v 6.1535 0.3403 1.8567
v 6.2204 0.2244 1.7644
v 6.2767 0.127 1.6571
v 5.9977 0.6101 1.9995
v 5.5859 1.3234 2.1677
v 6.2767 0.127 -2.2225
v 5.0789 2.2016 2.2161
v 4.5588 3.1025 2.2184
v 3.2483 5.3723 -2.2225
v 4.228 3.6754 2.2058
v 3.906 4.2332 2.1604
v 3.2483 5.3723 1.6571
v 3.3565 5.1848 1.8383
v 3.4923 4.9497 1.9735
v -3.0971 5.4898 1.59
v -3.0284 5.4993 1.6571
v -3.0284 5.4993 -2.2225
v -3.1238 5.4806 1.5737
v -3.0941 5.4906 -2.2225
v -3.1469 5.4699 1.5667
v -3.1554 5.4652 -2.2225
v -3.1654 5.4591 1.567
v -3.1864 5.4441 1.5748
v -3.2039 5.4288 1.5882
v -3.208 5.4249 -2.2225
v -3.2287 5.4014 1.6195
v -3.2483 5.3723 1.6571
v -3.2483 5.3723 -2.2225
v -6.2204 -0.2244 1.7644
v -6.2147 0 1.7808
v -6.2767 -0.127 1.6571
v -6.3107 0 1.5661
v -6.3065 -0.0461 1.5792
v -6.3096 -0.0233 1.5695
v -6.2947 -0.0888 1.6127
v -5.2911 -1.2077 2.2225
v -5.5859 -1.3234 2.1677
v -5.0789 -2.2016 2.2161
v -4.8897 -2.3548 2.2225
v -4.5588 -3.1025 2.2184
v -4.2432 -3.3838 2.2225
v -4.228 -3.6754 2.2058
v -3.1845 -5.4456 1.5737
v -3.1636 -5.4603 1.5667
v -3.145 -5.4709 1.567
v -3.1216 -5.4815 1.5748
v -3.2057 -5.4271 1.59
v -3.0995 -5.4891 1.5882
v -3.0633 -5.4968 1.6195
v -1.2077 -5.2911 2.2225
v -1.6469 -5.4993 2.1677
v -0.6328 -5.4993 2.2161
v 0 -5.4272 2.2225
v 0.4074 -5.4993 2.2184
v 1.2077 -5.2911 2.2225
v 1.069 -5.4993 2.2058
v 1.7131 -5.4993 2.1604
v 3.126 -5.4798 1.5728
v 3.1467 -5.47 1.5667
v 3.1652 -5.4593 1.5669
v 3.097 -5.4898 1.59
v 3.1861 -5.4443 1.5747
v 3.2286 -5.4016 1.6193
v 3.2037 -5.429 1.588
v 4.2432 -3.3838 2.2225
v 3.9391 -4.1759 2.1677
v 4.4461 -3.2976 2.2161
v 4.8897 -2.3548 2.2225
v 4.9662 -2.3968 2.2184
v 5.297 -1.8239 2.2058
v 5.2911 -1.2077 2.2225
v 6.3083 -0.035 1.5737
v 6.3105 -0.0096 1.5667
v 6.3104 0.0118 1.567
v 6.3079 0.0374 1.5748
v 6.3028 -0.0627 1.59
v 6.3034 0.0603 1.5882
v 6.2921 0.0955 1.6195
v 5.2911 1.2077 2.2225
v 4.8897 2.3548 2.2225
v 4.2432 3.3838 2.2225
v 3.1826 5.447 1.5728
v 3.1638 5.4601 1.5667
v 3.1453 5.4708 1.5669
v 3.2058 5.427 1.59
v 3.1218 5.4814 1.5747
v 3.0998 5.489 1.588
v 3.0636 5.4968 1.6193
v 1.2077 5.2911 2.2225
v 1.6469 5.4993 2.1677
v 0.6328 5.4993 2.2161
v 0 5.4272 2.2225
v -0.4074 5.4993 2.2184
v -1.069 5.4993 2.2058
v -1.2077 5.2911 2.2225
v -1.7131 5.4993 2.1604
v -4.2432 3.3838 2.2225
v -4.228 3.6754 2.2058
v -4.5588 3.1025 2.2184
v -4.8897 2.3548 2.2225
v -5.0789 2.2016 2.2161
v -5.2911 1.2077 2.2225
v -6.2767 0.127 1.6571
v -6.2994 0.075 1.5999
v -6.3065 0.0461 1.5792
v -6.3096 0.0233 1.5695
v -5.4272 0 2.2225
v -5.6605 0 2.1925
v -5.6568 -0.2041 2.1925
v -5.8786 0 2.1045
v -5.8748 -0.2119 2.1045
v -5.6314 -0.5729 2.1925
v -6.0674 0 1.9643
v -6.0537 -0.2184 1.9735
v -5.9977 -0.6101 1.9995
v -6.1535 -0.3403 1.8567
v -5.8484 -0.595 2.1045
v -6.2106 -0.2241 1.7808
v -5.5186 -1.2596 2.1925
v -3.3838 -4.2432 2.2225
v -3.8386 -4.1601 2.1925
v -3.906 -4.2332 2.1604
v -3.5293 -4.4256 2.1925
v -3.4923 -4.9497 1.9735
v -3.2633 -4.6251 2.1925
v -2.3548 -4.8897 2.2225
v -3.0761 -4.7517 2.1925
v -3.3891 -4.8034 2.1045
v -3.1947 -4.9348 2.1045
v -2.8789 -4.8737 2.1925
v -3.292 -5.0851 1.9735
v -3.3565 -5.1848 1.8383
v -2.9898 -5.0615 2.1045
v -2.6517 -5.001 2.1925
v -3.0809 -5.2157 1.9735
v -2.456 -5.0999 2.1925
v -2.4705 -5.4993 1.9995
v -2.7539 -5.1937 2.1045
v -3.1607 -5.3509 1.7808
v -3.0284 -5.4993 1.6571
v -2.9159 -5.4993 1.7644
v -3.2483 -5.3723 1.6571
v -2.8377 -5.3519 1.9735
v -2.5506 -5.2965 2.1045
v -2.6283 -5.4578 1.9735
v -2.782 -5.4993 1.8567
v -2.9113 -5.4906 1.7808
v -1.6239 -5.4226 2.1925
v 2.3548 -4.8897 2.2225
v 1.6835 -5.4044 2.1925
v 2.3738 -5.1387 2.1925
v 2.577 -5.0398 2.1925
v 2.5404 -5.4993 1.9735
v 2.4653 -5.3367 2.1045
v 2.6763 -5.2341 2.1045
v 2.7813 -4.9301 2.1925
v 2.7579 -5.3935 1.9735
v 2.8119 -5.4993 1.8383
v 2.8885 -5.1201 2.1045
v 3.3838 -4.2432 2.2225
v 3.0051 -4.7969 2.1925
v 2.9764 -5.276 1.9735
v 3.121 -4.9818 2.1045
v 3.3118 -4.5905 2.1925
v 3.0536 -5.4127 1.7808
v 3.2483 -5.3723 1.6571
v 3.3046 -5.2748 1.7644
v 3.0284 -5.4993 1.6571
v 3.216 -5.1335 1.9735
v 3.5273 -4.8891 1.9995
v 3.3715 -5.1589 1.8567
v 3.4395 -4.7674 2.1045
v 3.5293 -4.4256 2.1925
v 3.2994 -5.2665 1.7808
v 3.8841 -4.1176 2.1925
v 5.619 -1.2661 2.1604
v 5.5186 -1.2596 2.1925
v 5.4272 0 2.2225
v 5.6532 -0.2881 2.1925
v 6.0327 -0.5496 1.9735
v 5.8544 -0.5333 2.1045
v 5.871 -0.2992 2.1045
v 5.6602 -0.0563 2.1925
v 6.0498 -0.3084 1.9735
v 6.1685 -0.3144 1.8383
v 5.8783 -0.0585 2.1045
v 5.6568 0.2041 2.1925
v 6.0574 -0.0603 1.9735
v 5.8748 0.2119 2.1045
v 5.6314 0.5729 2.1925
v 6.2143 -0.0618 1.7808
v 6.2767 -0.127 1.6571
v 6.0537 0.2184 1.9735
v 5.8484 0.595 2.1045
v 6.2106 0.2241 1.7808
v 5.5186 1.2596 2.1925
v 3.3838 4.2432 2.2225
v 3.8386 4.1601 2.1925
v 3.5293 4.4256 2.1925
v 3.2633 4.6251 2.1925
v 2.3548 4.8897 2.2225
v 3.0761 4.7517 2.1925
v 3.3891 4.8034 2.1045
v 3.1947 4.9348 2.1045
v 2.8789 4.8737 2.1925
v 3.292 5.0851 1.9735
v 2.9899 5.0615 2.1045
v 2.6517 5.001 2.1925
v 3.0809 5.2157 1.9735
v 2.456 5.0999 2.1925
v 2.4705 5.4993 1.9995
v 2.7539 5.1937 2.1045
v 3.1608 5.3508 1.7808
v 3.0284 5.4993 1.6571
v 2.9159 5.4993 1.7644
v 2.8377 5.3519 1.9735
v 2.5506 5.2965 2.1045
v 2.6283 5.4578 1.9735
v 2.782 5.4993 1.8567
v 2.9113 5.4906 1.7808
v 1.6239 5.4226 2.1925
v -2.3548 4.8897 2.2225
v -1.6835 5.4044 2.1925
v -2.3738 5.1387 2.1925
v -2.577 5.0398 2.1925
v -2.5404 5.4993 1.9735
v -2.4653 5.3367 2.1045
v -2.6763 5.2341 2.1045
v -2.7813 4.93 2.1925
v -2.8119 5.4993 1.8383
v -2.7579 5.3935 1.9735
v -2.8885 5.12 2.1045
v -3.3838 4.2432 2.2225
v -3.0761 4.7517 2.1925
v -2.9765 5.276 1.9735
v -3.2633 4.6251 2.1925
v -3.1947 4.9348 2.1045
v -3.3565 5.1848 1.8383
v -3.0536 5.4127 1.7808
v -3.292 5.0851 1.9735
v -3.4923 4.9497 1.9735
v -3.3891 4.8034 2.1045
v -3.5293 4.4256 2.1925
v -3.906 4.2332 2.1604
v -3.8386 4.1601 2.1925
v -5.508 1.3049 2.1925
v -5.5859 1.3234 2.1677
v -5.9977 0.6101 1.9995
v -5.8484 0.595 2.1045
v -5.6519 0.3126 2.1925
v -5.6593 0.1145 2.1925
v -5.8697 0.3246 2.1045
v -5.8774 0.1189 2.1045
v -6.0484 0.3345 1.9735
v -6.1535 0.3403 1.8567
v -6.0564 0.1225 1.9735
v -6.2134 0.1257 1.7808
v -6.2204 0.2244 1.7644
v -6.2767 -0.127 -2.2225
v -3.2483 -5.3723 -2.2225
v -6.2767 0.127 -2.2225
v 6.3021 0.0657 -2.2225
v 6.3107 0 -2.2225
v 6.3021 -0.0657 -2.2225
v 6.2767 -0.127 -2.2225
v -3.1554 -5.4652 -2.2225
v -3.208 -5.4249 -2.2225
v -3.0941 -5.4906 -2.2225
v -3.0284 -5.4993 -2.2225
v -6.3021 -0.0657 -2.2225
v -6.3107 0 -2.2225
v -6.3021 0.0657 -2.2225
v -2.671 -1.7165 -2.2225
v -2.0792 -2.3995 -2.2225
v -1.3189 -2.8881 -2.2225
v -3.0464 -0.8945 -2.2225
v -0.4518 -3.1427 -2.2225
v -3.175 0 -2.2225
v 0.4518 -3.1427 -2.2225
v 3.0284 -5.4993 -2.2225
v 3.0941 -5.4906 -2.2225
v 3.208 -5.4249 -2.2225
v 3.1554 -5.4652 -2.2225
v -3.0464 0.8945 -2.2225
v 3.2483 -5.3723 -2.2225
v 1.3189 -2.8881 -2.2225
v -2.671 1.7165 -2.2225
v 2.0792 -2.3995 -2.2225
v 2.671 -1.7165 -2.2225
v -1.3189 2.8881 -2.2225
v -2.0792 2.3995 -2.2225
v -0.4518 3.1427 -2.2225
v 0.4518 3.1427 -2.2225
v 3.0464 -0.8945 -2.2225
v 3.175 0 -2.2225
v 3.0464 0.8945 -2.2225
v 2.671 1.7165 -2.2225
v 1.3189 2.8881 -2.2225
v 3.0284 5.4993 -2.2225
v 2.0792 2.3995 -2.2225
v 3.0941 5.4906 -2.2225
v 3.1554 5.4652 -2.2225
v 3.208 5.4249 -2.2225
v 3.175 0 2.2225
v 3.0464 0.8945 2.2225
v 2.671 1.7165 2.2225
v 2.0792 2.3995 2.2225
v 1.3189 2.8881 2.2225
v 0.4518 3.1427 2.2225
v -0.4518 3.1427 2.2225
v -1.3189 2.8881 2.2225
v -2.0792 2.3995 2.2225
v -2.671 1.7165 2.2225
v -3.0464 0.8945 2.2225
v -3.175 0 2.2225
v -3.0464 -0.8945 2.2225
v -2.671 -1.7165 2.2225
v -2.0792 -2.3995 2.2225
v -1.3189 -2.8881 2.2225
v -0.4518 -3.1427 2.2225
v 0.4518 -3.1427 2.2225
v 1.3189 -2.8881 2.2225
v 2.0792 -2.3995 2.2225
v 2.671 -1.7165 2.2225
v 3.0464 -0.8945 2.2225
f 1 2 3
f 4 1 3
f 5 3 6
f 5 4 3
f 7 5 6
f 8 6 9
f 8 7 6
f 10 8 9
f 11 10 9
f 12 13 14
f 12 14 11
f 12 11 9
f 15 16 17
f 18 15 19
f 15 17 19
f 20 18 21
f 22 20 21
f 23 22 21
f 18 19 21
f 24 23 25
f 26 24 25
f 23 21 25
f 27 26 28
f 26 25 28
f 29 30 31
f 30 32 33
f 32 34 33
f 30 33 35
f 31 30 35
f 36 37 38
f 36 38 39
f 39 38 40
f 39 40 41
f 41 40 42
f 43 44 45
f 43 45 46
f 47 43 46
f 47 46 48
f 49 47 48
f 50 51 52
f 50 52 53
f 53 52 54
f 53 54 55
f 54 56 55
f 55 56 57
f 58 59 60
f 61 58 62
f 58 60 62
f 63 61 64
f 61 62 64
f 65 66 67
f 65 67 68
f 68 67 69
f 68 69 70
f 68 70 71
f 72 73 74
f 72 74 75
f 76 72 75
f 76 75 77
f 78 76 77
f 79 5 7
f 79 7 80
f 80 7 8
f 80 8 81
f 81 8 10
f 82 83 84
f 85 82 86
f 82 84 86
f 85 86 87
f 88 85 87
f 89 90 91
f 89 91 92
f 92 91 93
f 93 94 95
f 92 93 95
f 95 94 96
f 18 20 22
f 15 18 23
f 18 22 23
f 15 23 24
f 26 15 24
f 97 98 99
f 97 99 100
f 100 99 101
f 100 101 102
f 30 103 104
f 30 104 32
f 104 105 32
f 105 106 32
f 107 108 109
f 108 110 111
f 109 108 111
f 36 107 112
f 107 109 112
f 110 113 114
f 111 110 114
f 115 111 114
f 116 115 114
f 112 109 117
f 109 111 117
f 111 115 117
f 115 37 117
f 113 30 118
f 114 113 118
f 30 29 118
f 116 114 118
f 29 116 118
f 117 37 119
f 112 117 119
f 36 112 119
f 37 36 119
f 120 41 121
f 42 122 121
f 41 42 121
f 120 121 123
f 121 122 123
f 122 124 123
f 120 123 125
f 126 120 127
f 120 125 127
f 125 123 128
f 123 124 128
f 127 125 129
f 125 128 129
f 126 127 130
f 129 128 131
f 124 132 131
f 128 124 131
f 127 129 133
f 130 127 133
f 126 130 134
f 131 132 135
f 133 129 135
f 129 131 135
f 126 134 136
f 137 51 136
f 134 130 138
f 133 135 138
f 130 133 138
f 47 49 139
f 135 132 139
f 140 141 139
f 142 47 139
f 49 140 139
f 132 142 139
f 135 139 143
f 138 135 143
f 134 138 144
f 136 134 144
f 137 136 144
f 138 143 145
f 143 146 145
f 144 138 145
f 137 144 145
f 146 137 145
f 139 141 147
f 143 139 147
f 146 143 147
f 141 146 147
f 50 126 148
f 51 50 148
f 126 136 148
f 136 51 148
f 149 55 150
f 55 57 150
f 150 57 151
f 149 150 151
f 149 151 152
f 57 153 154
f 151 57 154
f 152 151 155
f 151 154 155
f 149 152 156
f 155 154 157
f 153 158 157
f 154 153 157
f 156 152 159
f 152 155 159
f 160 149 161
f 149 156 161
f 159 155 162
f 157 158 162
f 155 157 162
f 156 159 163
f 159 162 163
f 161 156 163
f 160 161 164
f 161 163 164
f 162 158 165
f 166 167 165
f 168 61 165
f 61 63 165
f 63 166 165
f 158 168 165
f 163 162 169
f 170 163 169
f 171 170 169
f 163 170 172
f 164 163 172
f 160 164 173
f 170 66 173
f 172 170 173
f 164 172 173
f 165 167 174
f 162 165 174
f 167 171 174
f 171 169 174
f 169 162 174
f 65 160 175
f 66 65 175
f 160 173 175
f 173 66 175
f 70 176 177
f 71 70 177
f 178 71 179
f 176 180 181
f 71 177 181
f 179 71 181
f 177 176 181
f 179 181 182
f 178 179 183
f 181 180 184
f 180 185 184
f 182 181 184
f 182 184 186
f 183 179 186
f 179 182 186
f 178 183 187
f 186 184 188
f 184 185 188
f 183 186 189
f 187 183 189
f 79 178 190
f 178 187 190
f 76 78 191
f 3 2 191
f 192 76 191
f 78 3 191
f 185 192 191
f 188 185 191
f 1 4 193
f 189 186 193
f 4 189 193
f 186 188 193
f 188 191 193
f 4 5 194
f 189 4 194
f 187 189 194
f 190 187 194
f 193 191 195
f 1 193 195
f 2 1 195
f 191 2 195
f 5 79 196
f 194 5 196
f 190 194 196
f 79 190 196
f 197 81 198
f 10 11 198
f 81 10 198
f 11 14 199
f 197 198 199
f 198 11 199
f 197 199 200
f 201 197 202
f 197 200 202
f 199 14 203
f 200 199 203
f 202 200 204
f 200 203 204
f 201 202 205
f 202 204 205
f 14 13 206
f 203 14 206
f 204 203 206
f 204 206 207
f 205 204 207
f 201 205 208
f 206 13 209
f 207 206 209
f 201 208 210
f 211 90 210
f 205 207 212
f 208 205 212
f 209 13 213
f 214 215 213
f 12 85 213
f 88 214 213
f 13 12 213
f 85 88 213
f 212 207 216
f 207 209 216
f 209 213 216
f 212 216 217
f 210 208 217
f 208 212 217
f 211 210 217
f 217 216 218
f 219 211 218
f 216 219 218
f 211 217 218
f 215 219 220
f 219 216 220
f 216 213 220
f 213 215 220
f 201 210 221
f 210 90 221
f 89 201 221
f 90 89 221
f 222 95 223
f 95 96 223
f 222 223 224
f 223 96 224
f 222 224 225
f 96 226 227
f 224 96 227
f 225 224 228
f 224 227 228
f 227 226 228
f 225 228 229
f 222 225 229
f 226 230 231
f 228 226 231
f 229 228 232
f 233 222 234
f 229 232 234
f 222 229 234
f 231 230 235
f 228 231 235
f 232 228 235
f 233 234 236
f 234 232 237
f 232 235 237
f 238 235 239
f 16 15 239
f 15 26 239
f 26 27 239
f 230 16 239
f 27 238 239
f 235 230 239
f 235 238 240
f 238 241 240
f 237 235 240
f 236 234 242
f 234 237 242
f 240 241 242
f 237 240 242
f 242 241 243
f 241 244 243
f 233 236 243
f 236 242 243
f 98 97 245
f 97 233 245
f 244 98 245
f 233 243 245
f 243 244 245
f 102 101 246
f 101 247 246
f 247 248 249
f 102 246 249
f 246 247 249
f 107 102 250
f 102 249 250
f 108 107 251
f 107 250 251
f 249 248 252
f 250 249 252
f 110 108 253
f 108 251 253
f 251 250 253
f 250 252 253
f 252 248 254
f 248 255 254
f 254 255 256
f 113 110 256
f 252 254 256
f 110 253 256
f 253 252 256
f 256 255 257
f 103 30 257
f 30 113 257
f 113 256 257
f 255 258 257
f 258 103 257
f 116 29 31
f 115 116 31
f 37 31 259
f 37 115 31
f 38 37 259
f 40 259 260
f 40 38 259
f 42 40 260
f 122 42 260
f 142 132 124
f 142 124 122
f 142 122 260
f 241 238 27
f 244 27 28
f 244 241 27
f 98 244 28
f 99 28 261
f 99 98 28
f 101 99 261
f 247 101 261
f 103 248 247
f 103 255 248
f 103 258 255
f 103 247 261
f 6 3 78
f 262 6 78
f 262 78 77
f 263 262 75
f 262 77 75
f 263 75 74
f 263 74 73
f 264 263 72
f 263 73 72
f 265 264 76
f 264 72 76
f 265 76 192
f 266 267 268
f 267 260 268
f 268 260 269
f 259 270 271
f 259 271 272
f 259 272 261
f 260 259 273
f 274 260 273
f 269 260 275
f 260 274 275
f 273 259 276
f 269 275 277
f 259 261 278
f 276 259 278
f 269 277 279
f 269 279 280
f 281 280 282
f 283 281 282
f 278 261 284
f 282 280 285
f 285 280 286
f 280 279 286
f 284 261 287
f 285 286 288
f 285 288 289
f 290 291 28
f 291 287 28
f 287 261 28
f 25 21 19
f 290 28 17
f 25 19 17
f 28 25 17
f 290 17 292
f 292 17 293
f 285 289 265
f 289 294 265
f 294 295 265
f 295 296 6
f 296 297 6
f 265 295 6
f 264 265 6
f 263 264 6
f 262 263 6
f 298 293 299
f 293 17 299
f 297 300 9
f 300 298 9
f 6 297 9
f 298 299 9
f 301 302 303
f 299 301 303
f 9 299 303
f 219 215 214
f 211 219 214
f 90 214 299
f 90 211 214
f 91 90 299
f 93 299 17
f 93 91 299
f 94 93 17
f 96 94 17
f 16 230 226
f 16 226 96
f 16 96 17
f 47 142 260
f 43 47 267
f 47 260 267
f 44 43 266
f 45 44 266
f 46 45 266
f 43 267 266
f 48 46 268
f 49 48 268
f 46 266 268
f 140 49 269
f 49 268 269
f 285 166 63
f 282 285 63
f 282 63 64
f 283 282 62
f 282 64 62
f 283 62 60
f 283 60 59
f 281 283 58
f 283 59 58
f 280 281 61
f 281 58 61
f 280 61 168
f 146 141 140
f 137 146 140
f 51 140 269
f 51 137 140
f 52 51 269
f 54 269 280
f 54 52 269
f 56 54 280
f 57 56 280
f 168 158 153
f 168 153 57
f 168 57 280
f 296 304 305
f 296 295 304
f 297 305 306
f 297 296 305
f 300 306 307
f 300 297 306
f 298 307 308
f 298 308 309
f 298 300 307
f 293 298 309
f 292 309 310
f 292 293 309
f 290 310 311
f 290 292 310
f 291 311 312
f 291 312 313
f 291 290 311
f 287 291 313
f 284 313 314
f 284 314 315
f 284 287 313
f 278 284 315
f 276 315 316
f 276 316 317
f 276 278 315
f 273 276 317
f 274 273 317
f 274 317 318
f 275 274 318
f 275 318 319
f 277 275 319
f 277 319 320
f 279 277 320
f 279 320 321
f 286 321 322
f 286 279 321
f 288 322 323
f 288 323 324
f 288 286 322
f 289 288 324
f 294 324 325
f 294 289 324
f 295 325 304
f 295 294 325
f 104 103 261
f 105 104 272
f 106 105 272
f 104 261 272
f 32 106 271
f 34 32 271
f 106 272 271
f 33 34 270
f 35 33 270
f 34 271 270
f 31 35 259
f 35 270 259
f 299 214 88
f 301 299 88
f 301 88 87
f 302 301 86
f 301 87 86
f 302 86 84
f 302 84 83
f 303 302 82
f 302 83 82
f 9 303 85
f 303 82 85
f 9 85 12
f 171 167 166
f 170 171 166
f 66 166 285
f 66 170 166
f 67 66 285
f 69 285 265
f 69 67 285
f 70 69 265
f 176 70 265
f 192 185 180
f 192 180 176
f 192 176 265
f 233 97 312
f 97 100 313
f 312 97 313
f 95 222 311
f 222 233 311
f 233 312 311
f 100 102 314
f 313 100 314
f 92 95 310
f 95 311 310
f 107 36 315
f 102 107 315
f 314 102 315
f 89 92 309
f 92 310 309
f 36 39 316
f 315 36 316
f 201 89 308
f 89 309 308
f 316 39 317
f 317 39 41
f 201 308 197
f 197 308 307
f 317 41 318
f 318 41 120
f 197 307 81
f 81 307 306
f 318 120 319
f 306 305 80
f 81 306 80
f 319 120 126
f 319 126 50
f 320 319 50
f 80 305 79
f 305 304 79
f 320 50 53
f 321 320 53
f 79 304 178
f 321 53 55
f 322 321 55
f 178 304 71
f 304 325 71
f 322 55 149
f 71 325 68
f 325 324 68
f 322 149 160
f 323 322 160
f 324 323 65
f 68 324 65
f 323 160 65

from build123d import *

# Parameters (mm, degrees)
SKETCH1_R      = 3.175
EXTRUDE1_DEPTH = 2.2225
FILLET2_R      = 0.254


with BuildPart() as part:
    # Sketch1 → Extrude1 (new, symmetric)
    with BuildSketch(Plane.XY):
        Polygon((3.175, 5.499261314), (-3.175, 5.499261314), (-6.35, 0), (-3.175, -5.499261314), (3.175, -5.499261314), (6.35, 0), align=None)
        Circle(SKETCH1_R, mode=Mode.SUBTRACT)
    extrude(amount=EXTRUDE1_DEPTH, both=True)

    # Sketch7 → Cut-Revolve2 (revolve, cut)
    with BuildSketch(Plane(origin=(0, 0, 0), x_dir=(1, 0, 0), z_dir=(0, 1, 0)), mode=Mode.PRIVATE) as cut_revolve2_sk:
        with BuildLine():
            Line((5.310988996, -2.2225), (5.427200903, -2.2225))
            ThreePointArc((5.427200903, -2.2225), (6.079718402, -1.952218402), (6.35, -1.299700903))
            Line((6.35, -1.299700903), (6.71065175, -1.932108982))
            ThreePointArc((6.71065175, -1.932108982), (6.182957857, -2.514615502), (5.427200903, -2.7305))
            Line((5.427200903, -2.7305), (5.310988996, -2.7305))
            Line((5.310988996, -2.7305), (5.310988996, -2.2225))
        make_face()
    revolve(cut_revolve2_sk.sketch.rotate(Axis((0, 0, -4.413769038), (0, 0, 1)), 180), axis=Axis((0, 0, -4.413769038), (0, 0, 1)), mode=Mode.SUBTRACT)

    # Fillet2
    # the kernel refuses this fillet: 0.254 mm, written as the material it takes off along each edge
    with BuildSketch(Plane(origin=(-3.175, 5.499261314, -2.589117421), x_dir=(1, 0, 0), z_dir=(0, 0, 1)), Plane(origin=(3.175, 5.499261314, 1.666318324), x_dir=(-1, 0, 0), z_dir=(0, 0, -1)), Plane(origin=(6.35, 0, 1.666318324), x_dir=(-0.5000000000000007, 0.8660254037844384, 0), z_dir=(0, 0, -1)), Plane(origin=(3.175, -5.499261314, 1.666318324), x_dir=(0.49999999999999906, 0.8660254037844392, 0), z_dir=(0, 0, -1)), Plane(origin=(-3.175, -5.499261314, -2.589117421), x_dir=(-0.4999999999999997, 0.8660254037844387, 0), z_dir=(0, 0, 1)), Plane(origin=(-6.35, 0, -2.589117421), x_dir=(0.4999999999999968, 0.8660254037844406, 0), z_dir=(0, 0, 1))) as fillet2_piece_1:
        with BuildLine():
            CenterArc((FILLET2_R * 0.57735026919, -FILLET2_R), FILLET2_R, 90, 60)
            Line((-FILLET2_R * 0.288675134595, -FILLET2_R * 0.5), (0, 0))
            Line((0, 0), (FILLET2_R * 0.57735026919, 0))
        make_face()
    extrude(amount=4.255435745, mode=Mode.SUBTRACT)


solid = part.part
